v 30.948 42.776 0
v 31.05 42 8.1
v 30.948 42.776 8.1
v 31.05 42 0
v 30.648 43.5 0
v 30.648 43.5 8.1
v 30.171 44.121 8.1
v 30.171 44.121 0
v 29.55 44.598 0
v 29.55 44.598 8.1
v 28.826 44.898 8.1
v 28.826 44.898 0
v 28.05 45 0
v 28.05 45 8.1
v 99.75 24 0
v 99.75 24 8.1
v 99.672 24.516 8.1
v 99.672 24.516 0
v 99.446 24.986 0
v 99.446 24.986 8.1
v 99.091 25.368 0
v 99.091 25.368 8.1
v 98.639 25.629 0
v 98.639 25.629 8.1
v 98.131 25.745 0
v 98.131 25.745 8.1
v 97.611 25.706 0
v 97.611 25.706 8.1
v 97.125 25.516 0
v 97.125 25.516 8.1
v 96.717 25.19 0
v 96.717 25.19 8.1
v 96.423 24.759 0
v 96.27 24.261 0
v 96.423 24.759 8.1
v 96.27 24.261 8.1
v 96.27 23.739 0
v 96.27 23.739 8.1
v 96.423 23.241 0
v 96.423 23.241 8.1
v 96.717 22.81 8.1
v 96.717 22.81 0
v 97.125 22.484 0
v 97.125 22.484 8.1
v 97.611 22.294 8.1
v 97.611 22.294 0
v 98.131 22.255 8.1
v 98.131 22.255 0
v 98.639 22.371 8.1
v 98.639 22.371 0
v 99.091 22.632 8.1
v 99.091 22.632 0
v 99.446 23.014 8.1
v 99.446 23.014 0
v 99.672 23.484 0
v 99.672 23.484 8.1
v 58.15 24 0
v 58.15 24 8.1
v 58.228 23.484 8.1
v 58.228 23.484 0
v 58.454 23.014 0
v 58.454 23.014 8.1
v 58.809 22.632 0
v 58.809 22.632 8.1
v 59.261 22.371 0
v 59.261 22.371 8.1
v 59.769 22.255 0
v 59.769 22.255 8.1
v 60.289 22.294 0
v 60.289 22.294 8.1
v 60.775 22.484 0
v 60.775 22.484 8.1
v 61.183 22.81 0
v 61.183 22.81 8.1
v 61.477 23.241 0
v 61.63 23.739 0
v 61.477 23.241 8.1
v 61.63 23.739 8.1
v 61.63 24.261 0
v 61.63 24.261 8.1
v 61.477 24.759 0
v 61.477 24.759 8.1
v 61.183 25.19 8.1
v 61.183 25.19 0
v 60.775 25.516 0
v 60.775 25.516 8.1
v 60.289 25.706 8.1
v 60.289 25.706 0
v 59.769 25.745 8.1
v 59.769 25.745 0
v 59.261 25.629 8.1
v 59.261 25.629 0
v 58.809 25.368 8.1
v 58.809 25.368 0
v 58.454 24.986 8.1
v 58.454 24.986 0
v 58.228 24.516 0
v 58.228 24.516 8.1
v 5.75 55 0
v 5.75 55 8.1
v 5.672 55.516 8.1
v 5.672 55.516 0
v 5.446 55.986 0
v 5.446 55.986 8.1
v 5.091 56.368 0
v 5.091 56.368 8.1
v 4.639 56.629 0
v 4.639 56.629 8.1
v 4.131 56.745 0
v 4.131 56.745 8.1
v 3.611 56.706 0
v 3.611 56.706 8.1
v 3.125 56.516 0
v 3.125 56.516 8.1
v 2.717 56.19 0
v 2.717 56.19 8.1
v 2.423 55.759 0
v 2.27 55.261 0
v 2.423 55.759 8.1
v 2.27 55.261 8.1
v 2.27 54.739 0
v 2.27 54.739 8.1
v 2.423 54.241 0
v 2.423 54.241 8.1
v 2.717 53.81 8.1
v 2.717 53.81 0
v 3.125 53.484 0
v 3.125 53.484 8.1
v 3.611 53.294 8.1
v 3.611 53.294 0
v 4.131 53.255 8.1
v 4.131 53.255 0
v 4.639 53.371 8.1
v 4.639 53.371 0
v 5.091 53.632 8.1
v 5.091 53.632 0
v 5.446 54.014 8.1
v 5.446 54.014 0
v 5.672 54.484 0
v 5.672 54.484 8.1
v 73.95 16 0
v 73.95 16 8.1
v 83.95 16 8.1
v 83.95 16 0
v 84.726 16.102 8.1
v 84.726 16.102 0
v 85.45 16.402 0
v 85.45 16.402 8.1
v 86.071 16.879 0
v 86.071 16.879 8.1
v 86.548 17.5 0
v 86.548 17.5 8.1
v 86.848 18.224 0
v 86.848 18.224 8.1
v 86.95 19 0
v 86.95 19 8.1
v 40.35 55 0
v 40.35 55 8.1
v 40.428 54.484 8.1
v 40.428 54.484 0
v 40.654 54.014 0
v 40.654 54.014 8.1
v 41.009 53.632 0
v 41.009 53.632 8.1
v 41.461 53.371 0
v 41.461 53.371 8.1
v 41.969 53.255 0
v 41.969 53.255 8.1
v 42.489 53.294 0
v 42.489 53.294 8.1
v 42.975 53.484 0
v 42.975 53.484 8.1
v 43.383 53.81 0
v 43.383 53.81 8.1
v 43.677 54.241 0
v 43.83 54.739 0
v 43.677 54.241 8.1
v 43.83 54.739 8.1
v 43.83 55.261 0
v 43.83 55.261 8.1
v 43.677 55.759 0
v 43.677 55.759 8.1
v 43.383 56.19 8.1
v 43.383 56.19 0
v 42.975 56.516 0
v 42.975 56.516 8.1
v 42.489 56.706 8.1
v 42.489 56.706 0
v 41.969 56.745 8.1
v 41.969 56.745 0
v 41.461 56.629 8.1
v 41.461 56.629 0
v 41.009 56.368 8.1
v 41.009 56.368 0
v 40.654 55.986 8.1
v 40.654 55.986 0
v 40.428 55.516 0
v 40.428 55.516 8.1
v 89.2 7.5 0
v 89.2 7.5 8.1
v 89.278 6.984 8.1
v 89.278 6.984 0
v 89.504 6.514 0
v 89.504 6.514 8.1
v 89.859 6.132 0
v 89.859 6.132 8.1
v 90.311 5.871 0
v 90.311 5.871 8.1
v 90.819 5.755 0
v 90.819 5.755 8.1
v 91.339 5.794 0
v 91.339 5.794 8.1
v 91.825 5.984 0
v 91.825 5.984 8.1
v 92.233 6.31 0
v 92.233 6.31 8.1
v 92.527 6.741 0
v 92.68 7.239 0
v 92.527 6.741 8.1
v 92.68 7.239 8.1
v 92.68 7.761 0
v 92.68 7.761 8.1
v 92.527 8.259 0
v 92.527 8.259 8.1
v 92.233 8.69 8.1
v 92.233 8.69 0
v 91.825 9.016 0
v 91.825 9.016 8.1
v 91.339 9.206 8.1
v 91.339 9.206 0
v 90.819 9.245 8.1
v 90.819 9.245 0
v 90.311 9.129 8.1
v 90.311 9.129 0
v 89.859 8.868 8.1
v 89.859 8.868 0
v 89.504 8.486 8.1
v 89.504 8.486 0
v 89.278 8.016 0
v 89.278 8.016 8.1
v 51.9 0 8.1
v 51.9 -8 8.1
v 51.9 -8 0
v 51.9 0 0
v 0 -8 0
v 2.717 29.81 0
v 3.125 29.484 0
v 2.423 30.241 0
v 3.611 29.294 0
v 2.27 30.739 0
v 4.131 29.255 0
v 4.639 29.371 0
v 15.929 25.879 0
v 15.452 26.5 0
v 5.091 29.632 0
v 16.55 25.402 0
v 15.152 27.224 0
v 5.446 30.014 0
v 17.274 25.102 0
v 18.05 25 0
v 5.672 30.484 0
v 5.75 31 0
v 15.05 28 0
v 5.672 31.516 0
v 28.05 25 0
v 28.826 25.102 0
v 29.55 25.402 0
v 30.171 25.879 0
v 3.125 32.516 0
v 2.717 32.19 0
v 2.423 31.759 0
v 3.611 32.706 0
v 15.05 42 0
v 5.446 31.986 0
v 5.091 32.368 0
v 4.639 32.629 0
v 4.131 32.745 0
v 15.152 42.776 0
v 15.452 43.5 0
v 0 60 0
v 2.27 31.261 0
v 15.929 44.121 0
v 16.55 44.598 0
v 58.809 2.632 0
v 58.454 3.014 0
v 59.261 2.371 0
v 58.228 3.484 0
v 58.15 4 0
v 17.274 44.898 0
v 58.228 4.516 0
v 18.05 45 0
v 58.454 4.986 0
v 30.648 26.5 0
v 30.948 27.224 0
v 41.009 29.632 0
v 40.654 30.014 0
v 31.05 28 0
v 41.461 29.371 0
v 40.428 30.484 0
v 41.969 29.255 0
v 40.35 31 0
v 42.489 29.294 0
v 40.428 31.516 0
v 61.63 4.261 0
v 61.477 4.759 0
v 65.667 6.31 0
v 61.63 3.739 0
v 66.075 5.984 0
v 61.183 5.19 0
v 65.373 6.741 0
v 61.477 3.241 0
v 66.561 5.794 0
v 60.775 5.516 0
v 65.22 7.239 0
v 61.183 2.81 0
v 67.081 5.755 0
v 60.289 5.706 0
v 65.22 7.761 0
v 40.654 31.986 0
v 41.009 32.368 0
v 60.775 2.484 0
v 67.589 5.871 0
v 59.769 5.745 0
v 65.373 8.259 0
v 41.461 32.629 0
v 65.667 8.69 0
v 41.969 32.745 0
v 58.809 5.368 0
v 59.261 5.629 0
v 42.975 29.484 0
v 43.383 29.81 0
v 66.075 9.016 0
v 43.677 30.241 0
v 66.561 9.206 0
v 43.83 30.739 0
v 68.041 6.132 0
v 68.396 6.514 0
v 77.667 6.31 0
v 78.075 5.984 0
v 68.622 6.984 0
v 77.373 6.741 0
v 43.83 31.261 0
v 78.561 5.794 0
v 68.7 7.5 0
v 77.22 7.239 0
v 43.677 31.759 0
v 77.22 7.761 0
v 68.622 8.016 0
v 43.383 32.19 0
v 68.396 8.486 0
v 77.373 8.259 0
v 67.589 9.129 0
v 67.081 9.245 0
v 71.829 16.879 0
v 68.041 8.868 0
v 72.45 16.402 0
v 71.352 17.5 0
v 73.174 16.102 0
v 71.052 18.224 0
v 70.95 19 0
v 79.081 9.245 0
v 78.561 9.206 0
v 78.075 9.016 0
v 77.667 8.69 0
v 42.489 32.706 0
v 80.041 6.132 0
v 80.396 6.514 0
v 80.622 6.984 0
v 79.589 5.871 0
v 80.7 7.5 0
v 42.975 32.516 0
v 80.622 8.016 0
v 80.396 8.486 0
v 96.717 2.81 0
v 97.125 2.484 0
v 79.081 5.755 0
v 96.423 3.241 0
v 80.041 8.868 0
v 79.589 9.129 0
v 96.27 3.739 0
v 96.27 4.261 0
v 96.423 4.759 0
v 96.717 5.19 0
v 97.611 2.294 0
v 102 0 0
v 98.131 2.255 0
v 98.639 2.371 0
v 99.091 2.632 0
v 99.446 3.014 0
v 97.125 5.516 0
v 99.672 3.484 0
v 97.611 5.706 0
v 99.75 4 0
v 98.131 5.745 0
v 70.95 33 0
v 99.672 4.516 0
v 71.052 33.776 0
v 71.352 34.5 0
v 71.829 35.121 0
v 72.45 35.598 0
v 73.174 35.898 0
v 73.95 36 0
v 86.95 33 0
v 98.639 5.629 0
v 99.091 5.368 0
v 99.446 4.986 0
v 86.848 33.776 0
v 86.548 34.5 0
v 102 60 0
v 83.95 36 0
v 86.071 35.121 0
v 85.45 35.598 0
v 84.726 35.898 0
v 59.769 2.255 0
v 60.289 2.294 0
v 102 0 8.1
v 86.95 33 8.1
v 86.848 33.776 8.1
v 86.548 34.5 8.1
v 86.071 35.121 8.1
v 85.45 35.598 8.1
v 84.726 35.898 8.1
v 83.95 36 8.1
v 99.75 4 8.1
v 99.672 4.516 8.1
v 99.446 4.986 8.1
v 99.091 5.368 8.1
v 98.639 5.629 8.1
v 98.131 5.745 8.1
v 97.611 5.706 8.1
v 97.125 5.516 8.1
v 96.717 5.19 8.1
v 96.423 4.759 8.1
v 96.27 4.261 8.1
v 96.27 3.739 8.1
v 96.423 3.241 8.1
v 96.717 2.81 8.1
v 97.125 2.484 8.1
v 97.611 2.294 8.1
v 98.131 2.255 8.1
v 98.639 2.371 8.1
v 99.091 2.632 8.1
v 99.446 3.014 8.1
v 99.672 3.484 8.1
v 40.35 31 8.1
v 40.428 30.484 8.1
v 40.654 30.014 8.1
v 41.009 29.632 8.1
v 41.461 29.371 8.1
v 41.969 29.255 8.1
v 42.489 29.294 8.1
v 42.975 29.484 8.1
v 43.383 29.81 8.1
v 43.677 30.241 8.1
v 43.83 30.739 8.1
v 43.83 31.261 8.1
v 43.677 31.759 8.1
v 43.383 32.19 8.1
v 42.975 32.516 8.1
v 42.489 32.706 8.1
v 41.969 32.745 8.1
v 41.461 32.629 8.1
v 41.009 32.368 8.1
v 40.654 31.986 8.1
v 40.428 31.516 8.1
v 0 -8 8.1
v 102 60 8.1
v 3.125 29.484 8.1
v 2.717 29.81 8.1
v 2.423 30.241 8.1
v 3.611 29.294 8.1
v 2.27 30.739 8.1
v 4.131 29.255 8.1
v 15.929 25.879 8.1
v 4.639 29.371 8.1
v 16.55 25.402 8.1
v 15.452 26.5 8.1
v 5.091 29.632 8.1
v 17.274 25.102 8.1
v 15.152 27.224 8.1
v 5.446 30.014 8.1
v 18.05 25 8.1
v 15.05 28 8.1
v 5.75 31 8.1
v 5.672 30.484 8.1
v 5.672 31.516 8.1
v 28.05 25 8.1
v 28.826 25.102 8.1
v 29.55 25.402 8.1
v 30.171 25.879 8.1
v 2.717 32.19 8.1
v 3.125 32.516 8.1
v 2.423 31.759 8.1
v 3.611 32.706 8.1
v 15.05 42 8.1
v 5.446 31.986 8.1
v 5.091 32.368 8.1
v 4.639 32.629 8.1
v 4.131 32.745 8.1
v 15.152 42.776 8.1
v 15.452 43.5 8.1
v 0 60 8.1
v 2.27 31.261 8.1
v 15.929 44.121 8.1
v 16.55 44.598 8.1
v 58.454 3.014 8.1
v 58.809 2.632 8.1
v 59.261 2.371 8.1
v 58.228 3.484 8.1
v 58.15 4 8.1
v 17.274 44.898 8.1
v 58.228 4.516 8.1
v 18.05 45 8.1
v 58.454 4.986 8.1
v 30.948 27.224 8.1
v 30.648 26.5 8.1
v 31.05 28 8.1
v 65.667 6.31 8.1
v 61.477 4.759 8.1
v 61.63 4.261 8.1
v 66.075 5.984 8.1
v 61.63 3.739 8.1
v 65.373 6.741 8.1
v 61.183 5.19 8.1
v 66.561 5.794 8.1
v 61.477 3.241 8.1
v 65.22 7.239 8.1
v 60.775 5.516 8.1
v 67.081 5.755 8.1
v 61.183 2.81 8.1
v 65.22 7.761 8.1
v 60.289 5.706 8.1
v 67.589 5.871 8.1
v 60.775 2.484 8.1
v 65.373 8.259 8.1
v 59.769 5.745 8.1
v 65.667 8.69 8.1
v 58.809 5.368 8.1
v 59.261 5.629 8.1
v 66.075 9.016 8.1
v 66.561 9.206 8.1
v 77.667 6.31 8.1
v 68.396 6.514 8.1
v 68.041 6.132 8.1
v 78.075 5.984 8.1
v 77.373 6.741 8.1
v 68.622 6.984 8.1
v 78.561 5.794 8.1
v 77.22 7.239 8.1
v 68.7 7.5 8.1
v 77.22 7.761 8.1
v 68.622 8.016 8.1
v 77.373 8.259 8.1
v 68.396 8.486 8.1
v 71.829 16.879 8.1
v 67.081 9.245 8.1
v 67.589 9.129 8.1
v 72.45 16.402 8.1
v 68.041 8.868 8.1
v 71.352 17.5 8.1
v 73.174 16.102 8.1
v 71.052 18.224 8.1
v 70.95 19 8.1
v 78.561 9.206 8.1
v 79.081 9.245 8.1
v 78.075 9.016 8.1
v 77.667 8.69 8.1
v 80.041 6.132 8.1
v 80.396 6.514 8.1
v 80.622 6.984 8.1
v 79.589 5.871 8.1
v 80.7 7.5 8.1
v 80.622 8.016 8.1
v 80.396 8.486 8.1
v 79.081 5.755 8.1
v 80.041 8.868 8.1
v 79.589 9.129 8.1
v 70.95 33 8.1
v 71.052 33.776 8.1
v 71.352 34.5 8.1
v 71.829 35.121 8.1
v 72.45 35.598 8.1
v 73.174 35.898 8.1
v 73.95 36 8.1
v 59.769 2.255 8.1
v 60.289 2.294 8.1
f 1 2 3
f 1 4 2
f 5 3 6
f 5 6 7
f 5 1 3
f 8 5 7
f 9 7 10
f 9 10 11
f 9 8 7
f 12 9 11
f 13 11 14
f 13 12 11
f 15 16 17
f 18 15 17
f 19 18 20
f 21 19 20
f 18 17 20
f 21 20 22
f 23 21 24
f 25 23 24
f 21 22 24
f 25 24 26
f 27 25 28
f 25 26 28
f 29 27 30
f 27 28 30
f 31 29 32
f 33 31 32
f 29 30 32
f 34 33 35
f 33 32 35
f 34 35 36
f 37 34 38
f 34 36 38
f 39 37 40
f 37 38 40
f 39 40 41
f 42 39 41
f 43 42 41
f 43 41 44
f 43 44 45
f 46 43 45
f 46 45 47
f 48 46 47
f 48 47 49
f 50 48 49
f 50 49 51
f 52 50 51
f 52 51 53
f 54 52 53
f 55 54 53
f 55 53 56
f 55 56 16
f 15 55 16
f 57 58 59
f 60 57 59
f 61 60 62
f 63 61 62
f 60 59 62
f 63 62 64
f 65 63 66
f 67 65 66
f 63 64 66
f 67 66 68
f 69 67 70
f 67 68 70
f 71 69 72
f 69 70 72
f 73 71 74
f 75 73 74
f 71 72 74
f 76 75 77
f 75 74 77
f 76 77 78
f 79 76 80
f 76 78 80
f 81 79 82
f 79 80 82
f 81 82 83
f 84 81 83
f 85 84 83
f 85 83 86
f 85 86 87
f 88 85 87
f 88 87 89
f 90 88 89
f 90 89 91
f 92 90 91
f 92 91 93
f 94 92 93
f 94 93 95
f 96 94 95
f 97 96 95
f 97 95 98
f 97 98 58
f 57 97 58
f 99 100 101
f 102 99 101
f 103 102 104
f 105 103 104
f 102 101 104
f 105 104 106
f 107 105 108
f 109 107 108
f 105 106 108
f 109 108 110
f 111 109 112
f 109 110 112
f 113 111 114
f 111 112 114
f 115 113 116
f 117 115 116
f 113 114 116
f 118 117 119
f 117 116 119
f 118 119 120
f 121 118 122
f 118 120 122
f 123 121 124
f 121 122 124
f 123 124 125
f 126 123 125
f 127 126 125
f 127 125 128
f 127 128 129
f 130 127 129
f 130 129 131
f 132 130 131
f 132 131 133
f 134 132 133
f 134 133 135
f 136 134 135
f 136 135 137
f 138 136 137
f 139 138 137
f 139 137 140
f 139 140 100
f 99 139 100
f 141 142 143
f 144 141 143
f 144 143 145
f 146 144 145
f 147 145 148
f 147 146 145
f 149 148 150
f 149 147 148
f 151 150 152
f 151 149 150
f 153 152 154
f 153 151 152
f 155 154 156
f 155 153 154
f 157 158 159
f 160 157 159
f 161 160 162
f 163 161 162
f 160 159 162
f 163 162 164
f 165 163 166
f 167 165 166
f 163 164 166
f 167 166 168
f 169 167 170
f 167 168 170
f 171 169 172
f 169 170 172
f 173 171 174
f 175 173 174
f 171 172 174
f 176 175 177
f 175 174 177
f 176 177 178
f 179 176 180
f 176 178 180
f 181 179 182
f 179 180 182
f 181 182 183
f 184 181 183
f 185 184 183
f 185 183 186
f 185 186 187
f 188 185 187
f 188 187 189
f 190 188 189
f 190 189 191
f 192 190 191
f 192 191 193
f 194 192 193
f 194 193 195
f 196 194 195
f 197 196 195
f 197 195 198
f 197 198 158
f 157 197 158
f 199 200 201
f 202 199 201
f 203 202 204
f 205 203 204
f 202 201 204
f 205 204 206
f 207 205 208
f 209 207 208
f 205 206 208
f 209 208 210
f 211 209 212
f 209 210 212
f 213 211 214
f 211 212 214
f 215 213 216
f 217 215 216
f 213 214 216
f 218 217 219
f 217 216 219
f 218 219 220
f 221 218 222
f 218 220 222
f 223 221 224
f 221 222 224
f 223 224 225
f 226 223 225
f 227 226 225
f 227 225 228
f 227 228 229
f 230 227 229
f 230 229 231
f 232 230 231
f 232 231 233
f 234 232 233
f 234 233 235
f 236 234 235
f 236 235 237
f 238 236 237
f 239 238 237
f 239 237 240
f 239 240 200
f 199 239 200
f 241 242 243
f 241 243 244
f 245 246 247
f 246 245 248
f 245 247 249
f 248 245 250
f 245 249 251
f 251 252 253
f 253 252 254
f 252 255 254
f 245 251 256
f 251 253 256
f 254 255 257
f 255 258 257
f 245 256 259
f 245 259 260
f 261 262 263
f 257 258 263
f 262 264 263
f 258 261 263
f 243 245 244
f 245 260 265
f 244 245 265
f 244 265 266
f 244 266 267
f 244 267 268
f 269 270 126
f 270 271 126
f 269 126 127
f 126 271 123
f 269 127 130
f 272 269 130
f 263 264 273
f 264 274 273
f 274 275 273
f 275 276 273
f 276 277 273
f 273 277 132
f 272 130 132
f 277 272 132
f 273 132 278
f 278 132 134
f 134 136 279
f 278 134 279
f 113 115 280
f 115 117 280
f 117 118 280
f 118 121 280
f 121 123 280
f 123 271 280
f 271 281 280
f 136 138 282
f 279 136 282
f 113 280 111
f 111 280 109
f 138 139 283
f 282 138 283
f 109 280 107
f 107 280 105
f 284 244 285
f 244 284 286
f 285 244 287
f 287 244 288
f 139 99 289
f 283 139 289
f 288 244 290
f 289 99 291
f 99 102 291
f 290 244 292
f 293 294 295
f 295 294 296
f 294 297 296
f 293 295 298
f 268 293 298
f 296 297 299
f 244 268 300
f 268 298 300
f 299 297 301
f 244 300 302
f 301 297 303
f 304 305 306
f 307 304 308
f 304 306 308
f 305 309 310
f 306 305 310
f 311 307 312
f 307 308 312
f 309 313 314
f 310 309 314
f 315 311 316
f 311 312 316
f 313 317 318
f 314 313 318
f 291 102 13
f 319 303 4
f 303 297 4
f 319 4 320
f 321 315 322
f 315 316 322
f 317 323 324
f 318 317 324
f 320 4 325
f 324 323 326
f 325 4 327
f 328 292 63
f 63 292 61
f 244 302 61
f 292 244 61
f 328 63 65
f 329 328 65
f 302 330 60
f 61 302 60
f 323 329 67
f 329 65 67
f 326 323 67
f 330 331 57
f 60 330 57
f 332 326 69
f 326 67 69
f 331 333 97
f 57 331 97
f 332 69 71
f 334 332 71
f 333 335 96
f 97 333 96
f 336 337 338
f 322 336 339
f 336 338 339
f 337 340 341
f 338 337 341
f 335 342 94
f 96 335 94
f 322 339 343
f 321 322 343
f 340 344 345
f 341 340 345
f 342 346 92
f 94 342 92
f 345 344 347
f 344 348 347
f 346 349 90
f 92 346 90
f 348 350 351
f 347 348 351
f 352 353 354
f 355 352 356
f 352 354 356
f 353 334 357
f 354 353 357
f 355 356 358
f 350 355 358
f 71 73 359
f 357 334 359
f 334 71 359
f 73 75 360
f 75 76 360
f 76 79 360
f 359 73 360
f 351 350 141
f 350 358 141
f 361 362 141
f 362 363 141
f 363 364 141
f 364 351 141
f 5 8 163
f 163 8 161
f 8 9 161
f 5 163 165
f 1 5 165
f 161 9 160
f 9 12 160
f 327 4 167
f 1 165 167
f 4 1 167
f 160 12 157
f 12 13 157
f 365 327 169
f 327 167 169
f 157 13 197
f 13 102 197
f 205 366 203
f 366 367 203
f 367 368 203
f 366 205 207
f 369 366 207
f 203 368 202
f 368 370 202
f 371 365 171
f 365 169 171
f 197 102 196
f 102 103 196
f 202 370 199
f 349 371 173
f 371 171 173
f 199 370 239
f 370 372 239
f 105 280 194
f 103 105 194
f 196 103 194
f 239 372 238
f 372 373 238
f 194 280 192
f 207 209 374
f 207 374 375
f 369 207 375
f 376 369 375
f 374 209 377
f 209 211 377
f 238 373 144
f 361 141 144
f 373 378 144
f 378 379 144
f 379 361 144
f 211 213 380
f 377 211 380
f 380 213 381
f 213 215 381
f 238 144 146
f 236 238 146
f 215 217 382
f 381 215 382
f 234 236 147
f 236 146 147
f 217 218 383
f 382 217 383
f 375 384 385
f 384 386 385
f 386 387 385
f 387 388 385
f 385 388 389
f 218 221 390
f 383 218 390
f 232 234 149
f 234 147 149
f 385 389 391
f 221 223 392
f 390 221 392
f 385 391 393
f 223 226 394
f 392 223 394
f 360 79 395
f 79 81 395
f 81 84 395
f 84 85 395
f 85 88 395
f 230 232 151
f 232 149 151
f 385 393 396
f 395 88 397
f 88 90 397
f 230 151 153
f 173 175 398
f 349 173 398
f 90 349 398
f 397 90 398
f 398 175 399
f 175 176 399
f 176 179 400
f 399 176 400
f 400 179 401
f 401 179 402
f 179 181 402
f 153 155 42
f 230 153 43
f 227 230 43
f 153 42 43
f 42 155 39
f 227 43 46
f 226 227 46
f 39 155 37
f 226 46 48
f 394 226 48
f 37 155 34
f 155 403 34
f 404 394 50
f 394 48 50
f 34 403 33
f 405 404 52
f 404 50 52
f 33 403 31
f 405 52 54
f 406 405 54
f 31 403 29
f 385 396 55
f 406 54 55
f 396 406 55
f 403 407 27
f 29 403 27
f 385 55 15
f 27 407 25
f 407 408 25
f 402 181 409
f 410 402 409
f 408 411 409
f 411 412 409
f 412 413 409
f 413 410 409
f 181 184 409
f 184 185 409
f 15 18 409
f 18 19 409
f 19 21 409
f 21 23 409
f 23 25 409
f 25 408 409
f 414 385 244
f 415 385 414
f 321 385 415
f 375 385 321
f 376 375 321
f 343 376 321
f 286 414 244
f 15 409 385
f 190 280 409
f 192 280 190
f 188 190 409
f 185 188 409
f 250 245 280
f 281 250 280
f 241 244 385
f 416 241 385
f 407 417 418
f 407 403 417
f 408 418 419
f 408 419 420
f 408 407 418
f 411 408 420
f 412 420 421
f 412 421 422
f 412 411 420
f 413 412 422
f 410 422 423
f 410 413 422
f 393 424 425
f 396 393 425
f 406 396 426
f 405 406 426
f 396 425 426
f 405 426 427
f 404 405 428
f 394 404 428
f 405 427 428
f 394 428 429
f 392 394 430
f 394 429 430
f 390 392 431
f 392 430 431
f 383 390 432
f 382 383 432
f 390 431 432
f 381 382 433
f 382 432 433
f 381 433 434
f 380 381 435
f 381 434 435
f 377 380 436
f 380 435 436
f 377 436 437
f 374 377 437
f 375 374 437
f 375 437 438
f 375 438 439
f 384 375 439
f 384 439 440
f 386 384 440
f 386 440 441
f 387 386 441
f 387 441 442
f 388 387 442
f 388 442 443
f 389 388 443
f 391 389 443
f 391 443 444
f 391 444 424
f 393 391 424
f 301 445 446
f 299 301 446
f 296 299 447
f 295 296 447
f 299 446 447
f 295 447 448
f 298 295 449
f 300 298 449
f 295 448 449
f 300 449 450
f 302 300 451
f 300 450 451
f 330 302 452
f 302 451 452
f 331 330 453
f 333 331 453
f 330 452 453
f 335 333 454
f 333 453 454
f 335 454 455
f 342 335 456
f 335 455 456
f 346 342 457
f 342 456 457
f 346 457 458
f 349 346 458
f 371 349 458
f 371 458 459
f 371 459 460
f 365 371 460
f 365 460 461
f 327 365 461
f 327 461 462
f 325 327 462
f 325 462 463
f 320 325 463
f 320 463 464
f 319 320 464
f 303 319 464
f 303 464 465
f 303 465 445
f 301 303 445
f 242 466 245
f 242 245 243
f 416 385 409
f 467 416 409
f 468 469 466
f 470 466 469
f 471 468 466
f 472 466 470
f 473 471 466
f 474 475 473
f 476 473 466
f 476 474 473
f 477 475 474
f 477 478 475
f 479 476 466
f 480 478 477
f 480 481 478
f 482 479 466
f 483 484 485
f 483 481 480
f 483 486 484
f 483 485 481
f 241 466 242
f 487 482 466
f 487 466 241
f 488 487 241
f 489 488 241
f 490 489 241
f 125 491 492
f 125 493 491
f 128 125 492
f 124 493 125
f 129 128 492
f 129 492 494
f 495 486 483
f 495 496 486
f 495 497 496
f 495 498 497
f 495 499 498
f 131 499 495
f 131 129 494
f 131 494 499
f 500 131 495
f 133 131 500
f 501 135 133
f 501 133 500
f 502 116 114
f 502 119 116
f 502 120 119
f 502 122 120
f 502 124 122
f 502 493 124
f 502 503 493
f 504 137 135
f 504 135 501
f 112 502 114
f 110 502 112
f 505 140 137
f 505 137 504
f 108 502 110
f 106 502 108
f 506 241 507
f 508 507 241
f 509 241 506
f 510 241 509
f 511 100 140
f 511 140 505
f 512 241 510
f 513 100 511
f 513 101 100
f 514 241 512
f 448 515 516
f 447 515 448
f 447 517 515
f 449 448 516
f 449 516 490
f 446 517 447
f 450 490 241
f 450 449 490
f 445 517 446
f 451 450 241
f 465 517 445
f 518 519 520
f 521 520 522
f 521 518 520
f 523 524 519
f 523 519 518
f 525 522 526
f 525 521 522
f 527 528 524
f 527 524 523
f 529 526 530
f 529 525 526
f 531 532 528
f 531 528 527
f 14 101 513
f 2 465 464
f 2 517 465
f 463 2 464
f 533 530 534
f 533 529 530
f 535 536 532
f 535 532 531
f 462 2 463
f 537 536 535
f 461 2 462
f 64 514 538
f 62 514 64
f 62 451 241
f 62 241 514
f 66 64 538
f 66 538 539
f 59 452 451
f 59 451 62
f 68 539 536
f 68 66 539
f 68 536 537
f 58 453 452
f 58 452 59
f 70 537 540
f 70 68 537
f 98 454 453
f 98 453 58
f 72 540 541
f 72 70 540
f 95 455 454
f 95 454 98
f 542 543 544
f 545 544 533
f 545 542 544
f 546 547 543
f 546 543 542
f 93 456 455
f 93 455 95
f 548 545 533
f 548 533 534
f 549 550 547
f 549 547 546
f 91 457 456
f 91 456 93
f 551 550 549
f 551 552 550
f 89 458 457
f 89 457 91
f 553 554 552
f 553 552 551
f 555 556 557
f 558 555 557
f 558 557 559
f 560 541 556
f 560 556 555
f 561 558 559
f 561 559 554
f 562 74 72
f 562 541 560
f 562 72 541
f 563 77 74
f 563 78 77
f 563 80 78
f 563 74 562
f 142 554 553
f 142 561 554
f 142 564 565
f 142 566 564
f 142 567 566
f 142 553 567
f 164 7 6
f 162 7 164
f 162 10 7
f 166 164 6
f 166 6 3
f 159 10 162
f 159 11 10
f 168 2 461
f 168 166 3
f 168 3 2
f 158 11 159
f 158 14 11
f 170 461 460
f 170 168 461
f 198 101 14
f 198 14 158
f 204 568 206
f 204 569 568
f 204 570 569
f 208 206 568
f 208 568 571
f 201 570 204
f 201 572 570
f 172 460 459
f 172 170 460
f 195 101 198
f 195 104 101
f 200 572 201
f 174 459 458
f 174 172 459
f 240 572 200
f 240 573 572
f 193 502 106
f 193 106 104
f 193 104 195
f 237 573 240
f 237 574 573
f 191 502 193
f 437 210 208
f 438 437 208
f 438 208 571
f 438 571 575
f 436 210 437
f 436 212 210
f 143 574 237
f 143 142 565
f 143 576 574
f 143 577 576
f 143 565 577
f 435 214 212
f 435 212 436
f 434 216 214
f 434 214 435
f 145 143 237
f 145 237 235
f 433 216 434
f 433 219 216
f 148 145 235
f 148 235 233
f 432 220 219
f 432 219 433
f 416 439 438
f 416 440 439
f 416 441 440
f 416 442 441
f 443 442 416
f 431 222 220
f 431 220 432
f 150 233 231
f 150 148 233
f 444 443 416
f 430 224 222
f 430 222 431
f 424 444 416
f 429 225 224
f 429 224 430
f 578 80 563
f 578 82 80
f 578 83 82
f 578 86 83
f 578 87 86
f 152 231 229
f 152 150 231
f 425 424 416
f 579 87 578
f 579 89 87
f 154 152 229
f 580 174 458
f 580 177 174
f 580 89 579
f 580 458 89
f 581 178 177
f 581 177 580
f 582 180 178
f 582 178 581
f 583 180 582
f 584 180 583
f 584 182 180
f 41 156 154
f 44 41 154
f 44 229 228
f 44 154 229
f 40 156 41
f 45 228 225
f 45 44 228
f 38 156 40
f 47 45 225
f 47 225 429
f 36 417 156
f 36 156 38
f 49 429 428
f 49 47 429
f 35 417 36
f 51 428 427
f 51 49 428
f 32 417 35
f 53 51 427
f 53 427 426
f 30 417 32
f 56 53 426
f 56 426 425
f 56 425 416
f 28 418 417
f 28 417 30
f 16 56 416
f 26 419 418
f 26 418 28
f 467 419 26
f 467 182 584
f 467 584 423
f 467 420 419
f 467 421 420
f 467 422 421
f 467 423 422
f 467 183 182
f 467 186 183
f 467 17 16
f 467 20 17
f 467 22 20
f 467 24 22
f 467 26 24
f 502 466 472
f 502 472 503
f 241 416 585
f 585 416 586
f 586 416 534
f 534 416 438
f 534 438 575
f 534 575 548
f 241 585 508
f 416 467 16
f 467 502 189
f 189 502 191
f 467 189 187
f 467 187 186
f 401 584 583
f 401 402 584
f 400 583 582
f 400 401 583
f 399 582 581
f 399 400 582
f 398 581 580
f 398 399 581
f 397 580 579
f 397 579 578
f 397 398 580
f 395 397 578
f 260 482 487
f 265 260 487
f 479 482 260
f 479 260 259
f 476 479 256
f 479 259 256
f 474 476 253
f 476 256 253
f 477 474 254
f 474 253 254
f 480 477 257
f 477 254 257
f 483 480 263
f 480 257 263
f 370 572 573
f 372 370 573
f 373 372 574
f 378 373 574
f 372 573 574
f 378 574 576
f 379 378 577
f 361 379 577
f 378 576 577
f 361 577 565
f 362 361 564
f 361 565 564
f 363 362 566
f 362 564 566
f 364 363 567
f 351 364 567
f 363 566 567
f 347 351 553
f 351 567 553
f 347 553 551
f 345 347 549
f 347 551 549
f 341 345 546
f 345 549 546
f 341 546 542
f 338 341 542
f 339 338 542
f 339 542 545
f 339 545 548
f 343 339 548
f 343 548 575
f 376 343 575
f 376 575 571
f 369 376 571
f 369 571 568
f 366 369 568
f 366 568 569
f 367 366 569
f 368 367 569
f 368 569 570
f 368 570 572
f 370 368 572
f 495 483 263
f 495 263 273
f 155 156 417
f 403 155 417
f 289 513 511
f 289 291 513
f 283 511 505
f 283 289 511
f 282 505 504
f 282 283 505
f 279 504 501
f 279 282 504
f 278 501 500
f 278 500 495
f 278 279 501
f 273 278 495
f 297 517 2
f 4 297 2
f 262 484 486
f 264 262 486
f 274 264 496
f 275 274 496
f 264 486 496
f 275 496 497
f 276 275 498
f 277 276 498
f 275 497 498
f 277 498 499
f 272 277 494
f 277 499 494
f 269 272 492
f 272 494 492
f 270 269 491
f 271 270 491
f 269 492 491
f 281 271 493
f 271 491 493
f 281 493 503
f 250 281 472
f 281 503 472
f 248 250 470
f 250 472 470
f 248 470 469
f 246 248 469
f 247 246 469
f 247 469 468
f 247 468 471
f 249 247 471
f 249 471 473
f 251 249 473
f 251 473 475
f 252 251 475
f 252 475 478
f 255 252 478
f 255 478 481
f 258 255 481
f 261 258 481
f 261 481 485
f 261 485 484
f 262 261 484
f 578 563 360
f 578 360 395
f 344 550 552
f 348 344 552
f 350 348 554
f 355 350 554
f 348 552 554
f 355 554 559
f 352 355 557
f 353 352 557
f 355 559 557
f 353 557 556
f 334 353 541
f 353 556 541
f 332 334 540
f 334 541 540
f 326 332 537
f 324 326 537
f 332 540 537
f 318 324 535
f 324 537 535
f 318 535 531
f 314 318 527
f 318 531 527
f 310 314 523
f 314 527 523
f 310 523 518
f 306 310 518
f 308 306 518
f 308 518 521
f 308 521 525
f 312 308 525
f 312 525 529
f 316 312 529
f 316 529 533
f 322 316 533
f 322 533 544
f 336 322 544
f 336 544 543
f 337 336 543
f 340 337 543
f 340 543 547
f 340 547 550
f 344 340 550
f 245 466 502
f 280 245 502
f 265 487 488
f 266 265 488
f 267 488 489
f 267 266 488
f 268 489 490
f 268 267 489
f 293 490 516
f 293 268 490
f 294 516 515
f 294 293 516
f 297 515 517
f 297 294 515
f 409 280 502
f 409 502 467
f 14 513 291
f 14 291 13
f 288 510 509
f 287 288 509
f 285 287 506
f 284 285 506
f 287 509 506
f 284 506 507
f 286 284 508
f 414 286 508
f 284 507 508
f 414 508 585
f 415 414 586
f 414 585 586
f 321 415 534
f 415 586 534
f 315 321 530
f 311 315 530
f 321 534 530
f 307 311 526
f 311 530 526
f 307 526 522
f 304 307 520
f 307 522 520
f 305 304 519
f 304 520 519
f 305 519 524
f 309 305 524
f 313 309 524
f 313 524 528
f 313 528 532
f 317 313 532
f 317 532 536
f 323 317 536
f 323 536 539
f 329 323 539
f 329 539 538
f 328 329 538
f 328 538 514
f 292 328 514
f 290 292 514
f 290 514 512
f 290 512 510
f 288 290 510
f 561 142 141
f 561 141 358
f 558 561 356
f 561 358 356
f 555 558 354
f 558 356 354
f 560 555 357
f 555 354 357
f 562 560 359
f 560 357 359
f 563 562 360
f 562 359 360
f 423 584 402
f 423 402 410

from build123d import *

# Parameters (mm, degrees)
ESQUISSE1_W             = 102
ESQUISSE1_H             = 60
BOSS_EXTRU_1_DEPTH      = 8.1
ESQUISSE2_R             = 1.75
ENL_V_MAT_EXTRU_1_DEPTH = 119.61538686
ESQUISSE5_W             = 51.9
ESQUISSE5_H             = 8
BOSS_EXTRU_2_DEPTH      = 8.1
ESQUISSE6_W             = 16
ESQUISSE6_H             = 20
ENL_V_MAT_EXTRU_2_DEPTH = 119.61538686
CONG_1_R                = 3


with BuildPart() as part:
    # Esquisse1 → Boss.-Extru.1 (new body)
    with BuildSketch(Plane.XY):
        with Locations((51, 30)):
            Rectangle(ESQUISSE1_W, ESQUISSE1_H)
    extrude(amount=BOSS_EXTRU_1_DEPTH)

    # Esquisse2 → Enlèv. mat.-Extru.1 (cut, through all)
    with BuildSketch(Plane.XY.offset(8.1)):
        with Locations((4, 55)):
            Circle(ESQUISSE2_R)
        with Locations((4, 31)):
            Circle(ESQUISSE2_R)
        with Locations((98, 24)):
            Circle(ESQUISSE2_R)
        with Locations((98, 4)):
            Circle(ESQUISSE2_R)
        with Locations(Location((59.9, 4, 0), (0, 0, 180))):
            Circle(ESQUISSE2_R)
        with Locations(Location((59.9, 24, 0), (0, 0, 180))):
            Circle(ESQUISSE2_R)
        with Locations(Location((42.1, 31, 0), (0, 0, 180))):
            Circle(ESQUISSE2_R)
        with Locations(Location((42.1, 55, 0), (0, 0, 180))):
            Circle(ESQUISSE2_R)
        with Locations((66.95, 7.5)):
            Circle(ESQUISSE2_R)
        with Locations((78.95, 7.5)):
            Circle(ESQUISSE2_R)
        with Locations(Location((90.95, 7.5, 0), (0, 0, 180))):
            Circle(ESQUISSE2_R)
    extrude(amount=-ENL_V_MAT_EXTRU_1_DEPTH, mode=Mode.SUBTRACT)

    # Esquisse5 → Boss.-Extru.2 (add)
    with BuildSketch(Plane.XY.offset(8.1)):
        with Locations((25.95, -4)):
            Rectangle(ESQUISSE5_W, ESQUISSE5_H)
    extrude(amount=-BOSS_EXTRU_2_DEPTH)

    # Esquisse6 → Enlèv. mat.-Extru.2 (cut, through all)
    with BuildSketch(Plane.XY.offset(8.1)):
        with Locations((23.05, 35)):
            Rectangle(ESQUISSE6_W, ESQUISSE6_H)
        with Locations((78.95, 26)):
            Rectangle(ESQUISSE6_W, ESQUISSE6_H)
    extrude(amount=-ENL_V_MAT_EXTRU_2_DEPTH, mode=Mode.SUBTRACT)

    # Congé1
    cong_1_edges = [part.edges().sort_by_distance(p)[0] for p in [
        (15.05, 25, 4.05),
        (15.05, 45, 4.05),
        (31.05, 45, 4.05),
        (31.05, 25, 4.05),
        (86.95, 36, 4.05),
        (86.95, 16, 4.05),
        (70.95, 16, 4.05),
        (70.95, 36, 4.05),
    ]]
    fillet(cong_1_edges, radius=CONG_1_R)


solid = part.part
